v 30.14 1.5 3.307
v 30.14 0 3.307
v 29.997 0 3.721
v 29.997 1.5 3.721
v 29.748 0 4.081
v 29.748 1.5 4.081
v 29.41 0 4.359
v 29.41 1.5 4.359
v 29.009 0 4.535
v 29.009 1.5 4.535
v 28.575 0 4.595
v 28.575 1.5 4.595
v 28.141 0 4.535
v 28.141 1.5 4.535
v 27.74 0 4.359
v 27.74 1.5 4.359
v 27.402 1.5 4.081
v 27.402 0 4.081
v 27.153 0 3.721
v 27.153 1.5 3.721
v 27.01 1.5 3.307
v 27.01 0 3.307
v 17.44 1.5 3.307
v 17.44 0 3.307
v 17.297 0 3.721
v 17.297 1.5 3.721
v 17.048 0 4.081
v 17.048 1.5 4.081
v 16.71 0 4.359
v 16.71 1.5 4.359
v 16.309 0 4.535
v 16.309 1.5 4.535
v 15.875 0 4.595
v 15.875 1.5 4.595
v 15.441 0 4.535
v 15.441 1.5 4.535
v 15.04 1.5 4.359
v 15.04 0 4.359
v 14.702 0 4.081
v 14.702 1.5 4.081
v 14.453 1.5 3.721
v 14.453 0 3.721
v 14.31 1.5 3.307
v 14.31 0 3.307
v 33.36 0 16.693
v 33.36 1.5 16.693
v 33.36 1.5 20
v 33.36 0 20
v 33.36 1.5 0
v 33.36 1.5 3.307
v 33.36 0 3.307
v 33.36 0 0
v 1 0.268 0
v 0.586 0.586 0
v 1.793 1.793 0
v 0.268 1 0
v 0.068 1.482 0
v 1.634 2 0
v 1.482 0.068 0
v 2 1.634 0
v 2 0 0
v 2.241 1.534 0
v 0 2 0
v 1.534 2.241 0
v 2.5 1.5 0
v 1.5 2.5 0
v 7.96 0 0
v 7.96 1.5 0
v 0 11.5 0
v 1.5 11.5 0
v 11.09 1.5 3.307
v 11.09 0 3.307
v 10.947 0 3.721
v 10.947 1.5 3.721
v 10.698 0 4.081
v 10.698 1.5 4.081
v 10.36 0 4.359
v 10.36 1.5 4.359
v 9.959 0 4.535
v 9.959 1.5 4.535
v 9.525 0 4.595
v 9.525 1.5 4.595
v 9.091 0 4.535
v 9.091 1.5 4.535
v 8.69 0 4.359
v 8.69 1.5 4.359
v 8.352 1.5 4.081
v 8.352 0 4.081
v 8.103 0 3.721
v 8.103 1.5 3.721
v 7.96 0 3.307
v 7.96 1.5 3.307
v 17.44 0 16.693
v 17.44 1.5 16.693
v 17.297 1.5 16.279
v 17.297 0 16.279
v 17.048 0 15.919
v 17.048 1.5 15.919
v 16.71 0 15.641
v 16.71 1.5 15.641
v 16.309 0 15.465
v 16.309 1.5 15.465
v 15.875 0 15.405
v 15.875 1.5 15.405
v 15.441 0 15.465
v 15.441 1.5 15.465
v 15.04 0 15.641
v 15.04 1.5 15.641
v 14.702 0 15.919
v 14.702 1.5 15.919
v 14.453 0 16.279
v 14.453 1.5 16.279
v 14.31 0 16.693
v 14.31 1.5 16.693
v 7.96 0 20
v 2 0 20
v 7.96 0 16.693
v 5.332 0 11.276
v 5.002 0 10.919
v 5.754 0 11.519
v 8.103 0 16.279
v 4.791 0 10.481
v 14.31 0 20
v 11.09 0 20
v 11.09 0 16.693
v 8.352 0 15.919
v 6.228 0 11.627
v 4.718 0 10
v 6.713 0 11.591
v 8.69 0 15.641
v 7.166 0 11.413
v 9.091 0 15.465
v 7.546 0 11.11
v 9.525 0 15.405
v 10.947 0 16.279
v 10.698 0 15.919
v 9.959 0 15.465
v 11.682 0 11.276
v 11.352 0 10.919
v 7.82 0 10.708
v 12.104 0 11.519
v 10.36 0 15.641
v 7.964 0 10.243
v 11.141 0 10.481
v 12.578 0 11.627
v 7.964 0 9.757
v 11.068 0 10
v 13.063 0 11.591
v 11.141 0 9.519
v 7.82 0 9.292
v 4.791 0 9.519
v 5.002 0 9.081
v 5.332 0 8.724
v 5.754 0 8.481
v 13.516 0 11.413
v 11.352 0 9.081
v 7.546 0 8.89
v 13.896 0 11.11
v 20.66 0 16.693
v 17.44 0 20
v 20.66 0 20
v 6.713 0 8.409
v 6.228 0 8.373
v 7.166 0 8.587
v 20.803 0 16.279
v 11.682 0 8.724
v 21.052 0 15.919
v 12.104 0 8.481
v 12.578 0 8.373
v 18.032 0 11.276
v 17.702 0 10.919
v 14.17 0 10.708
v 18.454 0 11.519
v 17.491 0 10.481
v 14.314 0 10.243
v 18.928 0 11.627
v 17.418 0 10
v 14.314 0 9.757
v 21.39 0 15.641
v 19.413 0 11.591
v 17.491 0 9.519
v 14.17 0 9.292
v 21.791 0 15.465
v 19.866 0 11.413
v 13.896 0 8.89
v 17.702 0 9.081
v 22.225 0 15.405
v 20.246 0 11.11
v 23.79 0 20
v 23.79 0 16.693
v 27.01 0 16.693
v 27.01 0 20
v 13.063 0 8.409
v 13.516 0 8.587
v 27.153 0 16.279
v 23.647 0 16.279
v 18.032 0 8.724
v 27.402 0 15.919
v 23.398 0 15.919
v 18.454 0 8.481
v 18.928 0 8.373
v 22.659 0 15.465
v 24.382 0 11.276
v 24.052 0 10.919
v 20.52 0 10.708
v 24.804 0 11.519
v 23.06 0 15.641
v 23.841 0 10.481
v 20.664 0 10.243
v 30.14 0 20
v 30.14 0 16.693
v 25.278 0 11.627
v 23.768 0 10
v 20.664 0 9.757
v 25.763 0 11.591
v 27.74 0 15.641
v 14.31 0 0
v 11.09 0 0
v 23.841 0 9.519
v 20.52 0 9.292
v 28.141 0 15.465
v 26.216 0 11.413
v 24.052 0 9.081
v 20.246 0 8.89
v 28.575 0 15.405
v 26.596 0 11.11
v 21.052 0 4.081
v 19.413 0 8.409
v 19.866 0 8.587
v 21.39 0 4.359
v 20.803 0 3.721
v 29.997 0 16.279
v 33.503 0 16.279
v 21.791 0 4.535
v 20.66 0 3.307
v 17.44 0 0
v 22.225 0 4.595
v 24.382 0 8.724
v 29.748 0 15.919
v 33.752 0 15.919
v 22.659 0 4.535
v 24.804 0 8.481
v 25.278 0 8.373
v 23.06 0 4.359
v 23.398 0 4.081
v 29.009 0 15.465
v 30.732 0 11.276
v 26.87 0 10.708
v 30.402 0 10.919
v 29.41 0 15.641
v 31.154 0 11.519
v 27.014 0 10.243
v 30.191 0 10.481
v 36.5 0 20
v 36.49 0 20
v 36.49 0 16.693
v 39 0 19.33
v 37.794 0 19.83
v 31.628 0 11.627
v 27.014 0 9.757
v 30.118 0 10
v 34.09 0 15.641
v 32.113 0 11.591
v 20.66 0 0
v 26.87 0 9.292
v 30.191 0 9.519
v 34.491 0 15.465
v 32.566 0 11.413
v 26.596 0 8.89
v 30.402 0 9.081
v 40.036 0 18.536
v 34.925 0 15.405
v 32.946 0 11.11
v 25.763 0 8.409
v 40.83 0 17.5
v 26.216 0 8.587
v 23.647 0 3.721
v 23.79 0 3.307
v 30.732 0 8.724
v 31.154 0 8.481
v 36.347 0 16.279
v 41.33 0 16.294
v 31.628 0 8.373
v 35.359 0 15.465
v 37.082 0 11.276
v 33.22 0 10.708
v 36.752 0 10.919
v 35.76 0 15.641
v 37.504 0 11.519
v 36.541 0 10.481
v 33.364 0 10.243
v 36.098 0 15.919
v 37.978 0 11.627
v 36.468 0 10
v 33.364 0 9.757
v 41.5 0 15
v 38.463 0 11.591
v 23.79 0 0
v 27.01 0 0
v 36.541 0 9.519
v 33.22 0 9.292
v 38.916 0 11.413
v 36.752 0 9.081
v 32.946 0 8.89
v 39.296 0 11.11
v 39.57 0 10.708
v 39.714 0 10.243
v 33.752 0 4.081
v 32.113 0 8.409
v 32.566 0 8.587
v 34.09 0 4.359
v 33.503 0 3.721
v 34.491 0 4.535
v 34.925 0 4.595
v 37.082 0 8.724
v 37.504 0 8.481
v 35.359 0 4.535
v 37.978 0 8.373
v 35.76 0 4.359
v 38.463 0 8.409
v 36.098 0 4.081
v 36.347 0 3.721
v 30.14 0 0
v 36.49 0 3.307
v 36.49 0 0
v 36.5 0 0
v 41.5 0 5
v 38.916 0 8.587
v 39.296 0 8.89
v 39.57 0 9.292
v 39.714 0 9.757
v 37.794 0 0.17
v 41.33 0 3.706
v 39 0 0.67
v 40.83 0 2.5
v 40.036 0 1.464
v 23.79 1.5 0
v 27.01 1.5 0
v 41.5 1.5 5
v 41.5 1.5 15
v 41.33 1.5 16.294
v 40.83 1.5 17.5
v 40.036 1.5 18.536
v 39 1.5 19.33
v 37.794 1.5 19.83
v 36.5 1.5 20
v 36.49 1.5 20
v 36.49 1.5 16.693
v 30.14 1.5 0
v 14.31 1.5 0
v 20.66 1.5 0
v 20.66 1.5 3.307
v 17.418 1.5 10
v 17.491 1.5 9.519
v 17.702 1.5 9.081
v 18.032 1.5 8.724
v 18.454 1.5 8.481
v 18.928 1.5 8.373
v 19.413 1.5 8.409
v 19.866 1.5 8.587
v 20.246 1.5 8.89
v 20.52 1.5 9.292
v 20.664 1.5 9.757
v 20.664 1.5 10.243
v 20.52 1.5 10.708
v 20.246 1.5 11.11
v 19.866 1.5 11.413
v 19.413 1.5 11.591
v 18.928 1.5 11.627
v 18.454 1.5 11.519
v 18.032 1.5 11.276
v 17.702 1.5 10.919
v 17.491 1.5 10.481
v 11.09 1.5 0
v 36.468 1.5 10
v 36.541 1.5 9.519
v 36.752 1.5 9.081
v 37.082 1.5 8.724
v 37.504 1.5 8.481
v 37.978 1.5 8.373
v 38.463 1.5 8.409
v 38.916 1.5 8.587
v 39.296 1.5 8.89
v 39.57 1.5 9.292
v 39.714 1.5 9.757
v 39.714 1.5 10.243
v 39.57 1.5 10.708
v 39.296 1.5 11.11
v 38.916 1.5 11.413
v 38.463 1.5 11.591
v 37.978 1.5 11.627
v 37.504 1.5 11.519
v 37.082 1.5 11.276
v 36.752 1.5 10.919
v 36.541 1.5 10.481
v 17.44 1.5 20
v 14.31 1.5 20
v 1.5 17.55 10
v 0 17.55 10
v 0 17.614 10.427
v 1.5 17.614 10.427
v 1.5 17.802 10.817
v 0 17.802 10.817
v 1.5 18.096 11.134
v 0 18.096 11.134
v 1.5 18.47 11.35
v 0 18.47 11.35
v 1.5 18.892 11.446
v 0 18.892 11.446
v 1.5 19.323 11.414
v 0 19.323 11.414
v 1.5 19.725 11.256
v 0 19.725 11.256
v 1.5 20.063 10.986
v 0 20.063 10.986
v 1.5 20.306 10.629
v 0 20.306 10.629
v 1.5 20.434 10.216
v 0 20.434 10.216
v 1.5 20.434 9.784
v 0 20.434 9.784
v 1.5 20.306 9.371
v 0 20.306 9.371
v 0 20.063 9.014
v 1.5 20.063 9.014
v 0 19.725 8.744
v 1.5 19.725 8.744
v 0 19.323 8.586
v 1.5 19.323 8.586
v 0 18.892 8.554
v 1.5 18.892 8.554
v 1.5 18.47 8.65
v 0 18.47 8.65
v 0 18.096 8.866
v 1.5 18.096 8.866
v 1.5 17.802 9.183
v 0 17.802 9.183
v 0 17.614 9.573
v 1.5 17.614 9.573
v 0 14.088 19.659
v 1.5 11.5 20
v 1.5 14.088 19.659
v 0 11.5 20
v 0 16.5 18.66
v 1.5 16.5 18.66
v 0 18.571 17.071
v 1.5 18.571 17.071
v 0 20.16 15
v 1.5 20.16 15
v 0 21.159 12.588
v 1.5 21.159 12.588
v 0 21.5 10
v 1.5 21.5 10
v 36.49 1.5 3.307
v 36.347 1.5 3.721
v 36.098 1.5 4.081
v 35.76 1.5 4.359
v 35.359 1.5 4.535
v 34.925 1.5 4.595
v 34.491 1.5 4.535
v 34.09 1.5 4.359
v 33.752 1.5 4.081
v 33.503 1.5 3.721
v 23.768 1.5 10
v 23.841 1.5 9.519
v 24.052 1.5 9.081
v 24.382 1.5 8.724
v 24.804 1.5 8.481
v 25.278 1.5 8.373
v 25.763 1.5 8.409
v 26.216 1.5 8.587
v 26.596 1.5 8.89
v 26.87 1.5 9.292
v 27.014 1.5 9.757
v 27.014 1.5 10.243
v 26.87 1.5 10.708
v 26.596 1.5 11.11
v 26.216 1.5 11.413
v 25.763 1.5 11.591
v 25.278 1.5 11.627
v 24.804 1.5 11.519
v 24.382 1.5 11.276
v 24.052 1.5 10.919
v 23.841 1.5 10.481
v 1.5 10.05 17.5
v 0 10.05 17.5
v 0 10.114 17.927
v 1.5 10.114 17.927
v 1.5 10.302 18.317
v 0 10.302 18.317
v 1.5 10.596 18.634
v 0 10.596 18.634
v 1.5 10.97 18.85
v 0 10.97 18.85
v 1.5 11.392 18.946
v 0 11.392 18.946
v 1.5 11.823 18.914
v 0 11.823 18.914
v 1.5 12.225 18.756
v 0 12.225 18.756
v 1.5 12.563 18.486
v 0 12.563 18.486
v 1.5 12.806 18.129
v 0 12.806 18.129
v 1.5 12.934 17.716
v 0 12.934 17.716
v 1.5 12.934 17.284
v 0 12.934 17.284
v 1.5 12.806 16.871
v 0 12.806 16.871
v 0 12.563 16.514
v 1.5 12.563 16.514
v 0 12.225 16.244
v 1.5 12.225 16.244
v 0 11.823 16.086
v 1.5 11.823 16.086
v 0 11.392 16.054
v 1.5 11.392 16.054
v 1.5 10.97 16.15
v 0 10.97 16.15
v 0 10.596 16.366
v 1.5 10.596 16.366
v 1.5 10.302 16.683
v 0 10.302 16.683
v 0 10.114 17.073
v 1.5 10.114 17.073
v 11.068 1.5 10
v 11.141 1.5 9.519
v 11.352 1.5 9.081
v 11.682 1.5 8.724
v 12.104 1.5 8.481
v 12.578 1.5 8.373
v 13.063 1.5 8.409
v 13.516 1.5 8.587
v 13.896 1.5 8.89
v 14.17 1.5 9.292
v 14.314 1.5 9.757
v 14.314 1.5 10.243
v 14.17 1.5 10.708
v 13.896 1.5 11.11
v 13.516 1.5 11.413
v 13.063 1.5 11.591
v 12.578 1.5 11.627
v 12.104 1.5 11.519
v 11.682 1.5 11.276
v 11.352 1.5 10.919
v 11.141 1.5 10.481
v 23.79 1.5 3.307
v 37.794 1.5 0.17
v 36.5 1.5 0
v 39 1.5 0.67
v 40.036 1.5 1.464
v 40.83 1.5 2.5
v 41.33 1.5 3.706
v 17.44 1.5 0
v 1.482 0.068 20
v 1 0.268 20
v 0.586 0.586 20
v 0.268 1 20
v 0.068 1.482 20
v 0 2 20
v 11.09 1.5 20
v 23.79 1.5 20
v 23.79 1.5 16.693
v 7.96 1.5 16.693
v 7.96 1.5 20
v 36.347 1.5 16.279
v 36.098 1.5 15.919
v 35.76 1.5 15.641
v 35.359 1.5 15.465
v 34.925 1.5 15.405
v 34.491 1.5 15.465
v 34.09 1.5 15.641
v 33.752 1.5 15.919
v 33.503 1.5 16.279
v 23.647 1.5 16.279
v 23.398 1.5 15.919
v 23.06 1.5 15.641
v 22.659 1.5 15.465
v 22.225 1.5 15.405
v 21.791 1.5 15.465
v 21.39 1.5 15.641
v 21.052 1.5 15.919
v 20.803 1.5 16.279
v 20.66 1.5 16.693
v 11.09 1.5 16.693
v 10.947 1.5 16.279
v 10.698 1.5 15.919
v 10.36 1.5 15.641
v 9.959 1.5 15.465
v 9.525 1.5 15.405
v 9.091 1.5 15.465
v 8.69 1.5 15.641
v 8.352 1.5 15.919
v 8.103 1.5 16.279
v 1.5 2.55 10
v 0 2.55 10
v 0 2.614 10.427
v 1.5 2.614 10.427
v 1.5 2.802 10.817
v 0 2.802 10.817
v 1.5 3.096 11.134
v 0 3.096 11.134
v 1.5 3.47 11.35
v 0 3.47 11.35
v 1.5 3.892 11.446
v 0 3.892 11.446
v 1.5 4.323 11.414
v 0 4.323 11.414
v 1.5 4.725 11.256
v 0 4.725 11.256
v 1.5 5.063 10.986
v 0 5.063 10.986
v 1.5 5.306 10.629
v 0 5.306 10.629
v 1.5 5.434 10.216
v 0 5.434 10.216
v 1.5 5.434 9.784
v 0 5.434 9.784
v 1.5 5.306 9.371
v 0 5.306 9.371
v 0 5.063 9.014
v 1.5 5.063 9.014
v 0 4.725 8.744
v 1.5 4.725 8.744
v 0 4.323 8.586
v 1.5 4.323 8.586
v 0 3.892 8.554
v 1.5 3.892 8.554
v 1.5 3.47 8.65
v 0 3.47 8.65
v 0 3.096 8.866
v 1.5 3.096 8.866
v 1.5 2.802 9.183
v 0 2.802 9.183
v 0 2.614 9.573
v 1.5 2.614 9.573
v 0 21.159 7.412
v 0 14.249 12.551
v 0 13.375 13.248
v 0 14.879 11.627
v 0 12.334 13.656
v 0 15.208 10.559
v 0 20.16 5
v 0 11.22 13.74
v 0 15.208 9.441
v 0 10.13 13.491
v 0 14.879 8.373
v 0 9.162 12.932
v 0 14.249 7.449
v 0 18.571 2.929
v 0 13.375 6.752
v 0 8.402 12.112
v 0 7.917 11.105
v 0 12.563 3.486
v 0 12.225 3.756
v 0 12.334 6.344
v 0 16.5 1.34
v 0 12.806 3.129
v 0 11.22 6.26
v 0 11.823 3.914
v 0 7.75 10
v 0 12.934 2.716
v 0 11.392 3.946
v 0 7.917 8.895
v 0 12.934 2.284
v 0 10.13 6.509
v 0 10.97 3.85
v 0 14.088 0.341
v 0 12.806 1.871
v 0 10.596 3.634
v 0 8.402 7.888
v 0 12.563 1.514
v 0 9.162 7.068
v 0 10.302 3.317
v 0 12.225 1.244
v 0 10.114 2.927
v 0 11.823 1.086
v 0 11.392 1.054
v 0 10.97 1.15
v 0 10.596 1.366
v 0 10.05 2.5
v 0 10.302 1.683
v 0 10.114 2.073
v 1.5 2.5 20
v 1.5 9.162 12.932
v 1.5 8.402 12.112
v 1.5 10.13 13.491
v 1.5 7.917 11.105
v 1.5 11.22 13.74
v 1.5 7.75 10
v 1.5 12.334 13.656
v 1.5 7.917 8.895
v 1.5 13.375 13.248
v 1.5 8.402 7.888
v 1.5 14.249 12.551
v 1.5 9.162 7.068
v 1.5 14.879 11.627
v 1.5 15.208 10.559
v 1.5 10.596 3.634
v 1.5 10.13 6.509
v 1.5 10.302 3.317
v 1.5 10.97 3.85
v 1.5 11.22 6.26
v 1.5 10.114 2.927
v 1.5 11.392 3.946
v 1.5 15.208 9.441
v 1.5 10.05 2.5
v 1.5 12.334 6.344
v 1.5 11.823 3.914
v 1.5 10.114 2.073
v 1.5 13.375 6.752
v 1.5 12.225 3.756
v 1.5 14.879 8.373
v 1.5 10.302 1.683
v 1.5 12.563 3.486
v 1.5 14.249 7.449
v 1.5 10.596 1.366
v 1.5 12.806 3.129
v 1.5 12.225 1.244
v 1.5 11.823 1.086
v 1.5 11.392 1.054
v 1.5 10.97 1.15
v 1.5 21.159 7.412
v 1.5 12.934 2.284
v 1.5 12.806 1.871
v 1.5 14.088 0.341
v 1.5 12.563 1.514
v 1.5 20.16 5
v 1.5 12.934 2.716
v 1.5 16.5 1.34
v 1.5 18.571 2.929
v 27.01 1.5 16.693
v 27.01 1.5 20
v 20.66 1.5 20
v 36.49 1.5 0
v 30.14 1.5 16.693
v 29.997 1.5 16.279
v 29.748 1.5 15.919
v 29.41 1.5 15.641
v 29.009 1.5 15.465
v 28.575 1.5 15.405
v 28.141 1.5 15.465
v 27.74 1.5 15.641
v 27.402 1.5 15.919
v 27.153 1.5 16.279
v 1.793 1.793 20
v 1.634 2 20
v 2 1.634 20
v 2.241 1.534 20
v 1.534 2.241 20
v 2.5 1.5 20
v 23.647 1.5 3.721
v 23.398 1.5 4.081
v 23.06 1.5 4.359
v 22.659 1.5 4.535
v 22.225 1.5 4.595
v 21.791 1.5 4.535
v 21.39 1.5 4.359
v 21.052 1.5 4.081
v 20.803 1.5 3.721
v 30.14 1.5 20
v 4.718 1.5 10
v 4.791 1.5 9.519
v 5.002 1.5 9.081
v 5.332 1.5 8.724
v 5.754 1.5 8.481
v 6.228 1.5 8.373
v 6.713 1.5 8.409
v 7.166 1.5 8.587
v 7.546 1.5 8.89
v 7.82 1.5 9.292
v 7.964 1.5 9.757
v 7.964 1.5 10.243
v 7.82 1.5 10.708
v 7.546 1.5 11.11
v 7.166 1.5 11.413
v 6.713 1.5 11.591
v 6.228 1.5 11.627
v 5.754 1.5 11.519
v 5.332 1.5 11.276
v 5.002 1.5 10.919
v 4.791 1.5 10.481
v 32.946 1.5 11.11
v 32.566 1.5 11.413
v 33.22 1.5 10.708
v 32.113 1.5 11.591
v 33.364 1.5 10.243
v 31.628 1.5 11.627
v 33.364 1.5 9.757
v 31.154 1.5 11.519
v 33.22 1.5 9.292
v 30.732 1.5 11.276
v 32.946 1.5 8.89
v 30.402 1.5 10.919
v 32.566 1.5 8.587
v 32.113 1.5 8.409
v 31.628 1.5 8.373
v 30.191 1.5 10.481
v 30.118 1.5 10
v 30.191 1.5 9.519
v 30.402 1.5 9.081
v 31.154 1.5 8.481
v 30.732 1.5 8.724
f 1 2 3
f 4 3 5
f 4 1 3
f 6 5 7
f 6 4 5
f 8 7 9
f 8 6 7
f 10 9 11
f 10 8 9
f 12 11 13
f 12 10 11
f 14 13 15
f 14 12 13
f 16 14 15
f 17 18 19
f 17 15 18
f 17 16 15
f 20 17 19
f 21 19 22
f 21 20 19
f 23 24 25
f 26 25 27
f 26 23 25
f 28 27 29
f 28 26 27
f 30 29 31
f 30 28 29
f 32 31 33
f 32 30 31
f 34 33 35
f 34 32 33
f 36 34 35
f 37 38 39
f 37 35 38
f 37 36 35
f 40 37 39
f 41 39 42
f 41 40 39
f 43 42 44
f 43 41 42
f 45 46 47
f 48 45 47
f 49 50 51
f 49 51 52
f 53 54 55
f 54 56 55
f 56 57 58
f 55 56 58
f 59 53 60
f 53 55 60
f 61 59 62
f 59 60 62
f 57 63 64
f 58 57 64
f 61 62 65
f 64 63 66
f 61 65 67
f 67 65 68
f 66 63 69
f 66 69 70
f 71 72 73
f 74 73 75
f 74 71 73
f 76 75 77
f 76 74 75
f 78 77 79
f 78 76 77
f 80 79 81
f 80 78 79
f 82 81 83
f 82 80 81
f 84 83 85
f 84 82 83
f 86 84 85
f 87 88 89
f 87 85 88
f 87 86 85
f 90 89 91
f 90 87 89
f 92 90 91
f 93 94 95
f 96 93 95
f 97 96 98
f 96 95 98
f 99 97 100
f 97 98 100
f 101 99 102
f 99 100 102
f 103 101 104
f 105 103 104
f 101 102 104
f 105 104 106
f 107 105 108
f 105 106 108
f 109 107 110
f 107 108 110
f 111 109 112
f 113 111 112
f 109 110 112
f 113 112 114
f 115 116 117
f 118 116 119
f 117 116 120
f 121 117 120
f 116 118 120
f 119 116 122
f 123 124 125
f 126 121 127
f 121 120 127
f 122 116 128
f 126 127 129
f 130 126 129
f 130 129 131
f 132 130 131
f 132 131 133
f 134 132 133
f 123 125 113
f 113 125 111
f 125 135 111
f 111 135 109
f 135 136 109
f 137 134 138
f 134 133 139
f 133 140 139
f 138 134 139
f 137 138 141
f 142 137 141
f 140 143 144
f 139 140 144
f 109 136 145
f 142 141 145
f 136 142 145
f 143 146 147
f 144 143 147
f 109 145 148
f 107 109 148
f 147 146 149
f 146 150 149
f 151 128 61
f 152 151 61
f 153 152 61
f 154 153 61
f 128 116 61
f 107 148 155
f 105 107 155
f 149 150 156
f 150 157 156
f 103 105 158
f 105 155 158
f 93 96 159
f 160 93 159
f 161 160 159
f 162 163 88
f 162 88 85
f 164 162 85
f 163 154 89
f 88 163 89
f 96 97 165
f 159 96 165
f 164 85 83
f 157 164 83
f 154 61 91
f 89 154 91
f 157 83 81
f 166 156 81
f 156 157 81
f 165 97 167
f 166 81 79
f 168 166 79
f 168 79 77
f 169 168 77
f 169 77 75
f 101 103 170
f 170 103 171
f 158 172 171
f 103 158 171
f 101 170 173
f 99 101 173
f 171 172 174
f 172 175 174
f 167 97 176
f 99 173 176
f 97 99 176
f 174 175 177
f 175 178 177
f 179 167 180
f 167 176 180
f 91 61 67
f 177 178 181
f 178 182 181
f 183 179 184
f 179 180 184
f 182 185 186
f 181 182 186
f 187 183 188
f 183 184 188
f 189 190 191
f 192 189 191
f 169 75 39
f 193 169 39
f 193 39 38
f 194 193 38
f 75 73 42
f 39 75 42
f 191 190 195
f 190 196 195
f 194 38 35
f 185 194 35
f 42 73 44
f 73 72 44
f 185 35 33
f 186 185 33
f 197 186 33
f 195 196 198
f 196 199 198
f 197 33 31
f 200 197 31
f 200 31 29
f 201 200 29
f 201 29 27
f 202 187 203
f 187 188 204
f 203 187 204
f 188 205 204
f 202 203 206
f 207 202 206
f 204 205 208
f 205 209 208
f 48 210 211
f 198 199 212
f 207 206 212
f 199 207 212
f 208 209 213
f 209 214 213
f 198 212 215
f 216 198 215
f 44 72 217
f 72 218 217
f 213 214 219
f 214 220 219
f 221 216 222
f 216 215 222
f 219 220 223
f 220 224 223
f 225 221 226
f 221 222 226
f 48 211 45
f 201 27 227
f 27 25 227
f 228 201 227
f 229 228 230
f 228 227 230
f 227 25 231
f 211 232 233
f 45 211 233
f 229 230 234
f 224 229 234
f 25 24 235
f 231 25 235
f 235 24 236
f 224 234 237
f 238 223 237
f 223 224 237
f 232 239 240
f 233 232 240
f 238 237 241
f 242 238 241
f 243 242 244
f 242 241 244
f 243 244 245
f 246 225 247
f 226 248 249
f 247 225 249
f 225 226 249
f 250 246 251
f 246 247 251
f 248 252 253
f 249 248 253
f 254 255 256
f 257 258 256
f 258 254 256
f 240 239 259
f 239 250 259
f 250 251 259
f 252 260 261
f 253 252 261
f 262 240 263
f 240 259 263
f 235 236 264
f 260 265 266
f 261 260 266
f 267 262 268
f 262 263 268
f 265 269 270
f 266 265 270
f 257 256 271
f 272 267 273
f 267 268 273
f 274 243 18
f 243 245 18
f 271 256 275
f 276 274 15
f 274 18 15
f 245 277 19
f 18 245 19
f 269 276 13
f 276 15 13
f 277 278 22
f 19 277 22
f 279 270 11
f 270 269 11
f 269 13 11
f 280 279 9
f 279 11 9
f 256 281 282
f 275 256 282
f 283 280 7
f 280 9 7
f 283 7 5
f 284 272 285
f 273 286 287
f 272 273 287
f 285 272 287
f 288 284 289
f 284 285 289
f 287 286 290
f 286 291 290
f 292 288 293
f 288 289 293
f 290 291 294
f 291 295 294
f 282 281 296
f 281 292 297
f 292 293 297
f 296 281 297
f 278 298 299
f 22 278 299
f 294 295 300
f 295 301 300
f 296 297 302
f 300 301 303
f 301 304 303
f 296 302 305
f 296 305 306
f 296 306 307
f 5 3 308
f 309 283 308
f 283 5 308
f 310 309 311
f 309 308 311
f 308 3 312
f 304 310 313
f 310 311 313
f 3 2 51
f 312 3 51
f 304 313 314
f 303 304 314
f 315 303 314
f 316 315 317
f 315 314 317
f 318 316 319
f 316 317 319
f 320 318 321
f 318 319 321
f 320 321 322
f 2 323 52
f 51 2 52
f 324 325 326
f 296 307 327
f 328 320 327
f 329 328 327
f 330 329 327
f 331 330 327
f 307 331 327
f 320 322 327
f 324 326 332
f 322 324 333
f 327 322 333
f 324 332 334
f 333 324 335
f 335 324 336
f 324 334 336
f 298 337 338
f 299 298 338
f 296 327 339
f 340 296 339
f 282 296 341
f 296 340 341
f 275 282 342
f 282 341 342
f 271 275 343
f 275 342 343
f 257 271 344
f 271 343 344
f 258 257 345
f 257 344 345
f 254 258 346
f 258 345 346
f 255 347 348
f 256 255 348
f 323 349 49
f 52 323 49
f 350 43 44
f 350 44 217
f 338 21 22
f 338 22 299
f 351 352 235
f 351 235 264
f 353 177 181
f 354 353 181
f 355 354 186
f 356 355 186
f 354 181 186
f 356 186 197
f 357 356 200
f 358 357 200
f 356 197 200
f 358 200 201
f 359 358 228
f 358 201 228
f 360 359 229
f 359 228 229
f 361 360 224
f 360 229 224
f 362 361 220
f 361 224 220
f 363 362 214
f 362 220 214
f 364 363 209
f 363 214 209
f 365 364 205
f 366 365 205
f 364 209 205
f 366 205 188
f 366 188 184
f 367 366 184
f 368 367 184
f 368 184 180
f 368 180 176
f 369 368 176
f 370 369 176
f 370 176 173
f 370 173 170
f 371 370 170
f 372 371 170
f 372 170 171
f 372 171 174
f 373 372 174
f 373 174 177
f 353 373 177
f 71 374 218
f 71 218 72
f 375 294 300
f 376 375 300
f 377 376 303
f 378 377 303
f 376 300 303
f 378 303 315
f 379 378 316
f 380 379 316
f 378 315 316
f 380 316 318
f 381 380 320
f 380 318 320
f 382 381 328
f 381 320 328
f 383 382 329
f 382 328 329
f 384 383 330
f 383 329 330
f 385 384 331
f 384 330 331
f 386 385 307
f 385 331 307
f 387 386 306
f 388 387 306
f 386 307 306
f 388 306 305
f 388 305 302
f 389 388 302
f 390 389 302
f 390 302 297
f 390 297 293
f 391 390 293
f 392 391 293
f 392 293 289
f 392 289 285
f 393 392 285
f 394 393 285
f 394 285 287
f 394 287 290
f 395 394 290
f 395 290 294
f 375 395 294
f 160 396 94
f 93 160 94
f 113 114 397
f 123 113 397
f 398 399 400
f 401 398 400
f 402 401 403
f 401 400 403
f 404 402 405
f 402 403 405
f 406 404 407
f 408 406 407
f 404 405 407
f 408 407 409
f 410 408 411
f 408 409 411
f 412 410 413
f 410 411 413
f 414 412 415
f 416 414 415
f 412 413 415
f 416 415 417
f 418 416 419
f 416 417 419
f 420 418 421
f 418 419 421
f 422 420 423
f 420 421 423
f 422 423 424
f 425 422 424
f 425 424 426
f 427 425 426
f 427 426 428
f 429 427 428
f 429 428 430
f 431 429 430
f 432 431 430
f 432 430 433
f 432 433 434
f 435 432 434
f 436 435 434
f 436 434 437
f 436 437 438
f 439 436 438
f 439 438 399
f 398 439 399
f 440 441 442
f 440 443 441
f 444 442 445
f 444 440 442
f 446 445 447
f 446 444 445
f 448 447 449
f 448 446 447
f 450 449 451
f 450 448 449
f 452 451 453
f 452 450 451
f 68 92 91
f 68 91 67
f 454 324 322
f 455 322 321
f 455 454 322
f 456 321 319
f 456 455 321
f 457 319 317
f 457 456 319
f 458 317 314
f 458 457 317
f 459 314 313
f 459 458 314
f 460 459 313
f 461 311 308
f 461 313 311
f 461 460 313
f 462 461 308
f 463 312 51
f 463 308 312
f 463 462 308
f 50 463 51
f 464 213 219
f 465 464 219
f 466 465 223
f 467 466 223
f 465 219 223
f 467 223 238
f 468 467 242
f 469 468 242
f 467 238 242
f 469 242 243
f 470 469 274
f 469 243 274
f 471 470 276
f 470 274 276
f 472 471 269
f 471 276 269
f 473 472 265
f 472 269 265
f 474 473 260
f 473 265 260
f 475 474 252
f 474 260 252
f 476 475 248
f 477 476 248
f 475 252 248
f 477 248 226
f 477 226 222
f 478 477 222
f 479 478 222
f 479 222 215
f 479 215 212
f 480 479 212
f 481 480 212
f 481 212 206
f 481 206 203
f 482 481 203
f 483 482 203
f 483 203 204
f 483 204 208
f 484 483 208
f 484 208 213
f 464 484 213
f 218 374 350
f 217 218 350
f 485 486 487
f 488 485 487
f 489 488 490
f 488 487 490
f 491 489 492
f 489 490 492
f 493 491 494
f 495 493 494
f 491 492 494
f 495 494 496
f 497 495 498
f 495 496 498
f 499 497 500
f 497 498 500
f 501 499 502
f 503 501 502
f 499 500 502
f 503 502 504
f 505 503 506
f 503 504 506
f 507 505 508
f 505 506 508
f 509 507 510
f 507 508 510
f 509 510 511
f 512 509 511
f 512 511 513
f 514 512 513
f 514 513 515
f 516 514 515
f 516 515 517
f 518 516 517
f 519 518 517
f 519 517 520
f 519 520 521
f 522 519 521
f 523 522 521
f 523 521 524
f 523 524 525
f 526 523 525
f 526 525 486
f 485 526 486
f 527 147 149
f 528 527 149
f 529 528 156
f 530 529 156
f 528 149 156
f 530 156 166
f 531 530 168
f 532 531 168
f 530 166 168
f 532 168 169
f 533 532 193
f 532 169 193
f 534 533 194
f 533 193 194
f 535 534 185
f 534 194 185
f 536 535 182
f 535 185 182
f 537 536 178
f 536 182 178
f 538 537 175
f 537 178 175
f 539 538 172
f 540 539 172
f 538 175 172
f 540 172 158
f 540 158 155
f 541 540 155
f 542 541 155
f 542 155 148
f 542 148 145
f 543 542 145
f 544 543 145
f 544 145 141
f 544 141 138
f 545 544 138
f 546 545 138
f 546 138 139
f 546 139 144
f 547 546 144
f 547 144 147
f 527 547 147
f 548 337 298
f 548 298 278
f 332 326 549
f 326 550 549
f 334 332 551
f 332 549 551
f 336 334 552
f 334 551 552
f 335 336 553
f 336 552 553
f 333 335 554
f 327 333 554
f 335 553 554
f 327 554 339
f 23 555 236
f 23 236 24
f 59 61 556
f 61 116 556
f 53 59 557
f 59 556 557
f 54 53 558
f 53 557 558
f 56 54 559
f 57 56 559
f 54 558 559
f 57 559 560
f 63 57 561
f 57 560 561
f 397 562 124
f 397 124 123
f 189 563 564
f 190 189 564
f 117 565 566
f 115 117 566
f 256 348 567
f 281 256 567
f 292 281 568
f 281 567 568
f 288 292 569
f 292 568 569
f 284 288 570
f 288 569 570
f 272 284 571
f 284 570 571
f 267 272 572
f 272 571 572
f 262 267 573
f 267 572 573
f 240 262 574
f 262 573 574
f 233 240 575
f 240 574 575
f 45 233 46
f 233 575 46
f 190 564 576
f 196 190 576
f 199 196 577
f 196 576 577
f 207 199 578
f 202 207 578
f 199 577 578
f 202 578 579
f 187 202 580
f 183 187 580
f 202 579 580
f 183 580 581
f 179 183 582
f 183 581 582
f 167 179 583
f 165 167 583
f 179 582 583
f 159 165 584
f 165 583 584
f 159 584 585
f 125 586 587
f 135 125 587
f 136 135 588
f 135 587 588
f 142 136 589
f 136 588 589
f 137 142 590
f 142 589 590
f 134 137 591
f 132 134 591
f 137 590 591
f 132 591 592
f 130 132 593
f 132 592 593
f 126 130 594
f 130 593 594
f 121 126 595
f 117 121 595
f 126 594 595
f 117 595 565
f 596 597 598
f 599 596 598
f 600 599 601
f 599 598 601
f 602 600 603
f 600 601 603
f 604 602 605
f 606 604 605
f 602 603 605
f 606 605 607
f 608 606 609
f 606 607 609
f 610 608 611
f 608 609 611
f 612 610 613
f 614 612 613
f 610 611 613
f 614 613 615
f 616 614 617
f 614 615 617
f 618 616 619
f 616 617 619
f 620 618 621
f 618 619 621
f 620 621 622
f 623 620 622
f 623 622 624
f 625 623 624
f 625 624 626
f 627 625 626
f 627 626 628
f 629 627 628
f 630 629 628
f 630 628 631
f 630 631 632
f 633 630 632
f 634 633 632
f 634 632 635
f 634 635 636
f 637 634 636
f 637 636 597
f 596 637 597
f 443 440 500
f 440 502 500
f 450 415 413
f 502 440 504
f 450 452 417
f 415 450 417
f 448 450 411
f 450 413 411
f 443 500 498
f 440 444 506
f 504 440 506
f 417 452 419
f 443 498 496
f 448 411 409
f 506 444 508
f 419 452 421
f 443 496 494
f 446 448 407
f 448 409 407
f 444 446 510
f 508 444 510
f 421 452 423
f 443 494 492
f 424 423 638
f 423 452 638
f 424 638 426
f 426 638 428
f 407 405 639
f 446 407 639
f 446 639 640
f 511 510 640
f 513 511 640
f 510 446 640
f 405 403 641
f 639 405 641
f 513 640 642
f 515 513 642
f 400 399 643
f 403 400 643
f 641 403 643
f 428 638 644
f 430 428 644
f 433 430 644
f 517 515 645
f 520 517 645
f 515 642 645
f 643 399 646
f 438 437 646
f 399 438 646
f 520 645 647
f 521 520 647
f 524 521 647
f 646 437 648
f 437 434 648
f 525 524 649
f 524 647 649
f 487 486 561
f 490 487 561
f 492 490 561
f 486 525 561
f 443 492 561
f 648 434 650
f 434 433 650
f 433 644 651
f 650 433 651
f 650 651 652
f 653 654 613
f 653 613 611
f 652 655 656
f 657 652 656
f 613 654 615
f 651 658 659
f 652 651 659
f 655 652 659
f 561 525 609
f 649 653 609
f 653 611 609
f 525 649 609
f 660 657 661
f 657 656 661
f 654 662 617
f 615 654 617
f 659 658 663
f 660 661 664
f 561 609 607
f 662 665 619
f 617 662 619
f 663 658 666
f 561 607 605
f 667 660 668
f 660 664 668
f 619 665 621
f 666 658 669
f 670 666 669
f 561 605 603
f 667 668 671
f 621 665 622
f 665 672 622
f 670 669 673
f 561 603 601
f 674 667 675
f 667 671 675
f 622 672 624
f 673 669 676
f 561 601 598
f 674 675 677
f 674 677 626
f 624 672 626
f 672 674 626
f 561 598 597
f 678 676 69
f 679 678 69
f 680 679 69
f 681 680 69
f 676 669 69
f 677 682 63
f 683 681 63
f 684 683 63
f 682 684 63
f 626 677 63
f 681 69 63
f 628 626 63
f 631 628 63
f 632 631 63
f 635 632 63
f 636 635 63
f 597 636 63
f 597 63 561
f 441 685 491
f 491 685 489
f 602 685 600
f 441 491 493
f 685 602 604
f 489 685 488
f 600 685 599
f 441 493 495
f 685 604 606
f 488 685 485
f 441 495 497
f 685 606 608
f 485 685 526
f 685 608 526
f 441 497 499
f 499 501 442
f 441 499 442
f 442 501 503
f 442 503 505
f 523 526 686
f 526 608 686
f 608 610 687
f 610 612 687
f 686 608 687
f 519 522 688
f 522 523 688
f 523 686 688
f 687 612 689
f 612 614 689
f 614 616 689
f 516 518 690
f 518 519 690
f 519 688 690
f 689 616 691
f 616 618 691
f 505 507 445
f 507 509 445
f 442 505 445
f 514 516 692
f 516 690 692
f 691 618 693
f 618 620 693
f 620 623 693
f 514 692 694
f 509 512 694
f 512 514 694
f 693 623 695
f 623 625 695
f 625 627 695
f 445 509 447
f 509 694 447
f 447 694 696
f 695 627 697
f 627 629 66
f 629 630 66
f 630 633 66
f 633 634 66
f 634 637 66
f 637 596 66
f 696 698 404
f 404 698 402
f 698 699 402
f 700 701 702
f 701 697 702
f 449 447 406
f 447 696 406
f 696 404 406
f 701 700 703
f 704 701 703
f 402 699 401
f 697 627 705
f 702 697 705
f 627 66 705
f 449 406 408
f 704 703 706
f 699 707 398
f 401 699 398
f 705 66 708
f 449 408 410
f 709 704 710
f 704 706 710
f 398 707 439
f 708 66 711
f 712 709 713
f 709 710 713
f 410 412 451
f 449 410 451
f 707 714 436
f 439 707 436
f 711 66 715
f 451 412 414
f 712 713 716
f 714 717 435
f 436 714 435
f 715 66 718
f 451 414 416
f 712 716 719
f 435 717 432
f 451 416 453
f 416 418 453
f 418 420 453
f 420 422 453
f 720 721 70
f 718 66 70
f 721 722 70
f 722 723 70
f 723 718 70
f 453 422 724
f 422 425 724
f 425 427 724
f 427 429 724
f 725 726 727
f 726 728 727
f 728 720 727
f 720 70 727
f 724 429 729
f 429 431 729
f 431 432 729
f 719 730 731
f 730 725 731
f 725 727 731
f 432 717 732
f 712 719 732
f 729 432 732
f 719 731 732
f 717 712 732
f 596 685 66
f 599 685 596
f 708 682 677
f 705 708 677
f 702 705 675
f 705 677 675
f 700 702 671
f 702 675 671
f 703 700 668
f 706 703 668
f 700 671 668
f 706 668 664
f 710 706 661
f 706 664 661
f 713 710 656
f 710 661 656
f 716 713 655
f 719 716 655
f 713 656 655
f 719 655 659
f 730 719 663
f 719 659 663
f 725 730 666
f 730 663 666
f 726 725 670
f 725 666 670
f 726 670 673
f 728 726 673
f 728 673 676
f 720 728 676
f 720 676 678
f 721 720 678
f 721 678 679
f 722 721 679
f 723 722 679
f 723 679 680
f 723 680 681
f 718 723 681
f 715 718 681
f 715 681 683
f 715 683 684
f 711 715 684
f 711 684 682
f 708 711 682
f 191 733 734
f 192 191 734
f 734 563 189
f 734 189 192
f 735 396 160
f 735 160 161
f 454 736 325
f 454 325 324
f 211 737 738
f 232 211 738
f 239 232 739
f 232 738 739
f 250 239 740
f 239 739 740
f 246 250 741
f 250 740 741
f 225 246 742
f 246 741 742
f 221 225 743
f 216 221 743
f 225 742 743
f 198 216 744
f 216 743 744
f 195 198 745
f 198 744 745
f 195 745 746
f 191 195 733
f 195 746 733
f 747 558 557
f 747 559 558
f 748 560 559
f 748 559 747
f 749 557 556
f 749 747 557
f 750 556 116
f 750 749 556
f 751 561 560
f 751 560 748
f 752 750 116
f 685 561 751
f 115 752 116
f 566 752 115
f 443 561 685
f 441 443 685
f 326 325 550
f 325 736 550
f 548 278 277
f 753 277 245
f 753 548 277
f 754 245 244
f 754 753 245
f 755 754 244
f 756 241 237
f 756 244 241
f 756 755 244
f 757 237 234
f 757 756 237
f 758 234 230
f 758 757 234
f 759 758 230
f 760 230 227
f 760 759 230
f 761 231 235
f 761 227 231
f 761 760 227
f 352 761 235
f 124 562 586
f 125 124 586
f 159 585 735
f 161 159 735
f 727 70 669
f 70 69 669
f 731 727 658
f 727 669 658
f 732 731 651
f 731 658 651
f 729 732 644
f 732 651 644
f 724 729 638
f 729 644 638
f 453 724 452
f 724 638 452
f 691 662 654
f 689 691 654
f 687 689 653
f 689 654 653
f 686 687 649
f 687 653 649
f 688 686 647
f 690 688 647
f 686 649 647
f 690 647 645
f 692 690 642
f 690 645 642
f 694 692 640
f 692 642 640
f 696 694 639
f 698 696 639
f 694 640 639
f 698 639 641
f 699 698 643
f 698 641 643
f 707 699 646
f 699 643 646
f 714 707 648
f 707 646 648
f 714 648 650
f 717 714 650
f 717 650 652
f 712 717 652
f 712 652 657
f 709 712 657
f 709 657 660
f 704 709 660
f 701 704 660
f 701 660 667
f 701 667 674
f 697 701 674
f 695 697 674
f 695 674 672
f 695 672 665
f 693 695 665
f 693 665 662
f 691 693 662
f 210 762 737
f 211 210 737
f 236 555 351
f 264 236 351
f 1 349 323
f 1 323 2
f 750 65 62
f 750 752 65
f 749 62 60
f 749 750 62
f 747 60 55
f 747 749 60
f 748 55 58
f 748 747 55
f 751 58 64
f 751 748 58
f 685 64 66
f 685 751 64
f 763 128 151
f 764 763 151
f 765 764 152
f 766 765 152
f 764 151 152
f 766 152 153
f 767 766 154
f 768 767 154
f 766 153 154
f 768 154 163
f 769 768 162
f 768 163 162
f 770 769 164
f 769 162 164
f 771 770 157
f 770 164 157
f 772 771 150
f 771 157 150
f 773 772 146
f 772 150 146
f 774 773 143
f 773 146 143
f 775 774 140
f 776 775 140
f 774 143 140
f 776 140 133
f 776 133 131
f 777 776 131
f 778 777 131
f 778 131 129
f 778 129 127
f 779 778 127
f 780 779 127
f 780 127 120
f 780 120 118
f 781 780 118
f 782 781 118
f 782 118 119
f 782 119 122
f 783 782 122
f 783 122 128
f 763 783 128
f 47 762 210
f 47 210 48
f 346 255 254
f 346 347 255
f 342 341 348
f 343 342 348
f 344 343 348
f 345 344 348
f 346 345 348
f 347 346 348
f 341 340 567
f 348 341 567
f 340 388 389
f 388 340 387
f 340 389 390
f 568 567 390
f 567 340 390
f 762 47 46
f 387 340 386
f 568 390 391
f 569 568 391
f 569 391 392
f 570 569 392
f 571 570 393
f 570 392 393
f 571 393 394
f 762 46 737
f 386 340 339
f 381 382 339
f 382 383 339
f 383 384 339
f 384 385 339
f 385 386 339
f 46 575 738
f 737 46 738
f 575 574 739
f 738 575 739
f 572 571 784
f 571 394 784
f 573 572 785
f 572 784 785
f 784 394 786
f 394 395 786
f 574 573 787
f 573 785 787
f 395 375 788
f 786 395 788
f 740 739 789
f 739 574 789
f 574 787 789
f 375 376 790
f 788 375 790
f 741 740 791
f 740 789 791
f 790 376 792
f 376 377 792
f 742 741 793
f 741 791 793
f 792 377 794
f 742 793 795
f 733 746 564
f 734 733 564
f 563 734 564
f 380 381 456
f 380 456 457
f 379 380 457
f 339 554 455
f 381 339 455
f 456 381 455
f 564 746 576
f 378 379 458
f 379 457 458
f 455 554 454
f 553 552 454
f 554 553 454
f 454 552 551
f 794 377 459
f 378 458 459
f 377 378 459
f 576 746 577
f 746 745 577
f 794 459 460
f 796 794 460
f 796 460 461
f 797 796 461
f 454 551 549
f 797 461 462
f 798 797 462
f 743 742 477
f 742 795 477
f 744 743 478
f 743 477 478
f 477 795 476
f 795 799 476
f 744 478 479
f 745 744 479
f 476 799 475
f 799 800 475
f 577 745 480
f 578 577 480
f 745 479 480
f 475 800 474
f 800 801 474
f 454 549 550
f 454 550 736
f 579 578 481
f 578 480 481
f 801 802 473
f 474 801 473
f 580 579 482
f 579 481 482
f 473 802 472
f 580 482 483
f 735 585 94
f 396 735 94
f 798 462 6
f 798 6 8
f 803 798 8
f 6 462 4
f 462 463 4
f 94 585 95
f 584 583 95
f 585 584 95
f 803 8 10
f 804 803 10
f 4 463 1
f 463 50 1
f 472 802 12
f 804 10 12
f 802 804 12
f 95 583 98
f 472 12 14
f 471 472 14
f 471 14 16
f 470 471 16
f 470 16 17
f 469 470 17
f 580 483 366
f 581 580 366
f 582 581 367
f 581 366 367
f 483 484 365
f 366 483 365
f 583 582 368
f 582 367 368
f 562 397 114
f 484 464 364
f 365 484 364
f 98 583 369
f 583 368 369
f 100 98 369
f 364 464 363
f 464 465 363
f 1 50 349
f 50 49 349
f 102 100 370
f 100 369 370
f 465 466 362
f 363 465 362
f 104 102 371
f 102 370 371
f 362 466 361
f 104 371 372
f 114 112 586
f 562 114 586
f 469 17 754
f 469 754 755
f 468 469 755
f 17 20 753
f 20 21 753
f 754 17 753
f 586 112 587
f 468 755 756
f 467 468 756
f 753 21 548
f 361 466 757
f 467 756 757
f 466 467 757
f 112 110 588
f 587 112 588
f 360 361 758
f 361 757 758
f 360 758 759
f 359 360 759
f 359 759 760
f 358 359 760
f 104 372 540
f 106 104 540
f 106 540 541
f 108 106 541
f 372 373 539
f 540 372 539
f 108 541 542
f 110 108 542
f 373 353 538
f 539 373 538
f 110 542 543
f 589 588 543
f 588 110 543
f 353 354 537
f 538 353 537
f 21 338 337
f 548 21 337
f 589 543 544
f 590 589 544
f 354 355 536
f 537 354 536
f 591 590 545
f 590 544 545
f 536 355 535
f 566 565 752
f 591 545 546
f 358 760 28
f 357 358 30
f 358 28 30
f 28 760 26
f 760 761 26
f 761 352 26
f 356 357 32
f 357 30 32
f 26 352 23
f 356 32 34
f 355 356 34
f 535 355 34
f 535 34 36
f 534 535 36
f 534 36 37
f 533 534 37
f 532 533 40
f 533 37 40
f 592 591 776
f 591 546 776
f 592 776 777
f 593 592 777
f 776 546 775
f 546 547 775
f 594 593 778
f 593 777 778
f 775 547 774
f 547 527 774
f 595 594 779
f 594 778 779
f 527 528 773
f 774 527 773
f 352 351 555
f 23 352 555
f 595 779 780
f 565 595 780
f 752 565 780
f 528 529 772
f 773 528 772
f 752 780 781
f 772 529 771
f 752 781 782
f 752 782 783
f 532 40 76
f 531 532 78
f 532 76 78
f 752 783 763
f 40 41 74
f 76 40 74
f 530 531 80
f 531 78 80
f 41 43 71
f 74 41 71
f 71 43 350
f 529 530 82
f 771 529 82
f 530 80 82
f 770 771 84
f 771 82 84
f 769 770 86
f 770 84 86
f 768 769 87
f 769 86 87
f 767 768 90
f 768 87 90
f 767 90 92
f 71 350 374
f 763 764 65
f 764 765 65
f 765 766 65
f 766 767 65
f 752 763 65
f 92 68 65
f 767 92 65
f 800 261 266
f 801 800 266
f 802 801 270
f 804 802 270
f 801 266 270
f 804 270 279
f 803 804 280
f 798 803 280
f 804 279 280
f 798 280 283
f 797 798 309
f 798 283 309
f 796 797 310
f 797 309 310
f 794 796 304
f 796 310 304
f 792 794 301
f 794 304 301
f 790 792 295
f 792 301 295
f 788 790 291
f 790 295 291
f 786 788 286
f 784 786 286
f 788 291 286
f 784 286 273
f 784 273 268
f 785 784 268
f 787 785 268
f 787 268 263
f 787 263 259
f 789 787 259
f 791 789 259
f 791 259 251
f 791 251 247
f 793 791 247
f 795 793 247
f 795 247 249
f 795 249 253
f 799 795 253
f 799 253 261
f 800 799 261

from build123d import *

# Parameters (mm, degrees)
BOSS_EXTRUDE1_DEPTH   = 20
FILLET1_R             = 2
FILLET2_R             = 1
CUT_EXTRUDE1_DEPTH    = 51.222007128
F_4_CLEARANCE_HOLE1_D = 3.2639
FILLET3_R             = 5
FILLET4_R             = 10
SKETCH7_R             = 3.75
SKETCH7_R_2           = 1.45
CUT_EXTRUDE2_DEPTH    = 51.83797793


with BuildPart() as part:
    # Sketch1 → Boss-Extrude1 (new body)
    with BuildSketch(Plane.XY):
        Polygon((0, 0), (41.5, 0), (41.5, 1.5), (1.5, 1.5), (1.5, 21.5), (0, 21.5), align=None)
    extrude(amount=BOSS_EXTRUDE1_DEPTH)

    # Fillet1
    fillet1_edges = [part.edges().sort_by_distance(p)[0] for p in [
        (0, 0, 10),
    ]]
    fillet(fillet1_edges, radius=FILLET1_R)

    # Fillet2
    fillet2_edges = [part.edges().sort_by_distance(p)[0] for p in [
        (1.5, 1.5, 10),
    ]]
    fillet(fillet2_edges, radius=FILLET2_R)

    # Sketch3 → Cut-Extrude1 (cut, through all)
    with BuildSketch(Plane(origin=(0, 1.5, 0), x_dir=(1, 0, 0), z_dir=(0, 1, 0))):
        with BuildLine():
            Line((7.96, 0), (11.09, 0))
            Line((11.09, 0), (11.09, -3.307162367))
            ThreePointArc((11.09, -3.307162367), (9.525, -4.594858526), (7.96, -3.307162367))
            Line((7.96, -3.307162367), (7.96, 0))
        make_face()
        with BuildLine():
            Line((14.31, 0), (17.44, 0))
            Line((17.44, 0), (17.44, -3.307162367))
            ThreePointArc((17.44, -3.307162367), (15.875, -4.594858526), (14.31, -3.307162367))
            Line((14.31, -3.307162367), (14.31, 0))
        make_face()
        with BuildLine():
            Line((20.66, 0), (23.79, 0))
            Line((23.79, 0), (23.79, -3.307162367))
            ThreePointArc((23.79, -3.307162367), (22.225, -4.594858526), (20.66, -3.307162367))
            Line((20.66, -3.307162367), (20.66, 0))
        make_face()
        with BuildLine():
            Line((27.01, 0), (30.14, 0))
            Line((30.14, 0), (30.14, -3.307162367))
            ThreePointArc((30.14, -3.307162367), (28.575, -4.594858526), (27.01, -3.307162367))
            Line((27.01, -3.307162367), (27.01, 0))
        make_face()
        with BuildLine():
            Line((33.36, 0), (36.49, 0))
            Line((36.49, 0), (36.49, -3.307162367))
            ThreePointArc((36.49, -3.307162367), (34.925, -4.594858526), (33.36, -3.307162367))
            Line((33.36, -3.307162367), (33.36, 0))
        make_face()
        with BuildLine():
            Line((36.49, -20), (36.49, -16.692837633))
            ThreePointArc((36.49, -16.692837633), (34.925, -15.405141474), (33.36, -16.692837633))
            Line((33.36, -16.692837633), (33.36, -20))
            Line((33.36, -20), (36.49, -20))
        make_face()
        with BuildLine():
            Line((30.14, -20), (30.14, -16.692837633))
            ThreePointArc((30.14, -16.692837633), (28.575, -15.405141474), (27.01, -16.692837633))
            Line((27.01, -16.692837633), (27.01, -20))
            Line((27.01, -20), (30.14, -20))
        make_face()
        with BuildLine():
            Line((23.79, -20), (23.79, -16.692837633))
            ThreePointArc((23.79, -16.692837633), (22.225, -15.405141474), (20.66, -16.692837633))
            Line((20.66, -16.692837633), (20.66, -20))
            Line((20.66, -20), (23.79, -20))
        make_face()
        with BuildLine():
            Line((17.44, -20), (17.44, -16.692837633))
            ThreePointArc((17.44, -16.692837633), (15.875, -15.405141474), (14.31, -16.692837633))
            Line((14.31, -16.692837633), (14.31, -20))
            Line((14.31, -20), (17.44, -20))
        make_face()
        with BuildLine():
            Line((11.09, -20), (11.09, -16.692837633))
            ThreePointArc((11.09, -16.692837633), (9.525, -15.405141474), (7.96, -16.692837633))
            Line((7.96, -16.692837633), (7.96, -20))
            Line((7.96, -20), (11.09, -20))
        make_face()
    extrude(amount=-CUT_EXTRUDE1_DEPTH, mode=Mode.SUBTRACT)

    # #4 Clearance Hole1 (through all)
    with Locations(Plane(origin=(0, 1.5, 0), x_dir=(1, 0, 0), z_dir=(0, 1, 0))):
        with Locations((6.35, -10), (12.7, -10), (25.4, -10), (31.75, -10), (38.1, -10), (19.05, -10)):
            Hole(F_4_CLEARANCE_HOLE1_D / 2)

    # Fillet3
    fillet3_edges = [part.edges().sort_by_distance(p)[0] for p in [
        (41.5, 0.75, 20),
        (41.5, 0.75, 0),
    ]]
    fillet(fillet3_edges, radius=FILLET3_R)

    # Fillet4
    fillet4_edges = [part.edges().sort_by_distance(p)[0] for p in [
        (0.75, 21.5, 0),
        (0.75, 21.5, 20),
    ]]
    fillet(fillet4_edges, radius=FILLET4_R - 0.0001)  # a hair under: the kernel refuses the full size

    # Sketch7 → Cut-Extrude2 (cut, through all)
    with BuildSketch(Plane.ZY):
        with Locations(Location((10, 11.5, 0), (0, 0, 270))):
            Circle(SKETCH7_R)
        with Locations(Location((10, 19, 0), (0, 0, 270))):
            Circle(SKETCH7_R_2)
        with Locations(Location((17.5, 11.5, 0), (0, 0, 270))):
            Circle(SKETCH7_R_2)
        with Locations(Location((10, 4, 0), (0, 0, 270))):
            Circle(SKETCH7_R_2)
        with Locations(Location((2.5, 11.5, 0), (0, 0, 270))):
            Circle(SKETCH7_R_2)
    extrude(amount=-CUT_EXTRUDE2_DEPTH, mode=Mode.SUBTRACT)


solid = part.part
